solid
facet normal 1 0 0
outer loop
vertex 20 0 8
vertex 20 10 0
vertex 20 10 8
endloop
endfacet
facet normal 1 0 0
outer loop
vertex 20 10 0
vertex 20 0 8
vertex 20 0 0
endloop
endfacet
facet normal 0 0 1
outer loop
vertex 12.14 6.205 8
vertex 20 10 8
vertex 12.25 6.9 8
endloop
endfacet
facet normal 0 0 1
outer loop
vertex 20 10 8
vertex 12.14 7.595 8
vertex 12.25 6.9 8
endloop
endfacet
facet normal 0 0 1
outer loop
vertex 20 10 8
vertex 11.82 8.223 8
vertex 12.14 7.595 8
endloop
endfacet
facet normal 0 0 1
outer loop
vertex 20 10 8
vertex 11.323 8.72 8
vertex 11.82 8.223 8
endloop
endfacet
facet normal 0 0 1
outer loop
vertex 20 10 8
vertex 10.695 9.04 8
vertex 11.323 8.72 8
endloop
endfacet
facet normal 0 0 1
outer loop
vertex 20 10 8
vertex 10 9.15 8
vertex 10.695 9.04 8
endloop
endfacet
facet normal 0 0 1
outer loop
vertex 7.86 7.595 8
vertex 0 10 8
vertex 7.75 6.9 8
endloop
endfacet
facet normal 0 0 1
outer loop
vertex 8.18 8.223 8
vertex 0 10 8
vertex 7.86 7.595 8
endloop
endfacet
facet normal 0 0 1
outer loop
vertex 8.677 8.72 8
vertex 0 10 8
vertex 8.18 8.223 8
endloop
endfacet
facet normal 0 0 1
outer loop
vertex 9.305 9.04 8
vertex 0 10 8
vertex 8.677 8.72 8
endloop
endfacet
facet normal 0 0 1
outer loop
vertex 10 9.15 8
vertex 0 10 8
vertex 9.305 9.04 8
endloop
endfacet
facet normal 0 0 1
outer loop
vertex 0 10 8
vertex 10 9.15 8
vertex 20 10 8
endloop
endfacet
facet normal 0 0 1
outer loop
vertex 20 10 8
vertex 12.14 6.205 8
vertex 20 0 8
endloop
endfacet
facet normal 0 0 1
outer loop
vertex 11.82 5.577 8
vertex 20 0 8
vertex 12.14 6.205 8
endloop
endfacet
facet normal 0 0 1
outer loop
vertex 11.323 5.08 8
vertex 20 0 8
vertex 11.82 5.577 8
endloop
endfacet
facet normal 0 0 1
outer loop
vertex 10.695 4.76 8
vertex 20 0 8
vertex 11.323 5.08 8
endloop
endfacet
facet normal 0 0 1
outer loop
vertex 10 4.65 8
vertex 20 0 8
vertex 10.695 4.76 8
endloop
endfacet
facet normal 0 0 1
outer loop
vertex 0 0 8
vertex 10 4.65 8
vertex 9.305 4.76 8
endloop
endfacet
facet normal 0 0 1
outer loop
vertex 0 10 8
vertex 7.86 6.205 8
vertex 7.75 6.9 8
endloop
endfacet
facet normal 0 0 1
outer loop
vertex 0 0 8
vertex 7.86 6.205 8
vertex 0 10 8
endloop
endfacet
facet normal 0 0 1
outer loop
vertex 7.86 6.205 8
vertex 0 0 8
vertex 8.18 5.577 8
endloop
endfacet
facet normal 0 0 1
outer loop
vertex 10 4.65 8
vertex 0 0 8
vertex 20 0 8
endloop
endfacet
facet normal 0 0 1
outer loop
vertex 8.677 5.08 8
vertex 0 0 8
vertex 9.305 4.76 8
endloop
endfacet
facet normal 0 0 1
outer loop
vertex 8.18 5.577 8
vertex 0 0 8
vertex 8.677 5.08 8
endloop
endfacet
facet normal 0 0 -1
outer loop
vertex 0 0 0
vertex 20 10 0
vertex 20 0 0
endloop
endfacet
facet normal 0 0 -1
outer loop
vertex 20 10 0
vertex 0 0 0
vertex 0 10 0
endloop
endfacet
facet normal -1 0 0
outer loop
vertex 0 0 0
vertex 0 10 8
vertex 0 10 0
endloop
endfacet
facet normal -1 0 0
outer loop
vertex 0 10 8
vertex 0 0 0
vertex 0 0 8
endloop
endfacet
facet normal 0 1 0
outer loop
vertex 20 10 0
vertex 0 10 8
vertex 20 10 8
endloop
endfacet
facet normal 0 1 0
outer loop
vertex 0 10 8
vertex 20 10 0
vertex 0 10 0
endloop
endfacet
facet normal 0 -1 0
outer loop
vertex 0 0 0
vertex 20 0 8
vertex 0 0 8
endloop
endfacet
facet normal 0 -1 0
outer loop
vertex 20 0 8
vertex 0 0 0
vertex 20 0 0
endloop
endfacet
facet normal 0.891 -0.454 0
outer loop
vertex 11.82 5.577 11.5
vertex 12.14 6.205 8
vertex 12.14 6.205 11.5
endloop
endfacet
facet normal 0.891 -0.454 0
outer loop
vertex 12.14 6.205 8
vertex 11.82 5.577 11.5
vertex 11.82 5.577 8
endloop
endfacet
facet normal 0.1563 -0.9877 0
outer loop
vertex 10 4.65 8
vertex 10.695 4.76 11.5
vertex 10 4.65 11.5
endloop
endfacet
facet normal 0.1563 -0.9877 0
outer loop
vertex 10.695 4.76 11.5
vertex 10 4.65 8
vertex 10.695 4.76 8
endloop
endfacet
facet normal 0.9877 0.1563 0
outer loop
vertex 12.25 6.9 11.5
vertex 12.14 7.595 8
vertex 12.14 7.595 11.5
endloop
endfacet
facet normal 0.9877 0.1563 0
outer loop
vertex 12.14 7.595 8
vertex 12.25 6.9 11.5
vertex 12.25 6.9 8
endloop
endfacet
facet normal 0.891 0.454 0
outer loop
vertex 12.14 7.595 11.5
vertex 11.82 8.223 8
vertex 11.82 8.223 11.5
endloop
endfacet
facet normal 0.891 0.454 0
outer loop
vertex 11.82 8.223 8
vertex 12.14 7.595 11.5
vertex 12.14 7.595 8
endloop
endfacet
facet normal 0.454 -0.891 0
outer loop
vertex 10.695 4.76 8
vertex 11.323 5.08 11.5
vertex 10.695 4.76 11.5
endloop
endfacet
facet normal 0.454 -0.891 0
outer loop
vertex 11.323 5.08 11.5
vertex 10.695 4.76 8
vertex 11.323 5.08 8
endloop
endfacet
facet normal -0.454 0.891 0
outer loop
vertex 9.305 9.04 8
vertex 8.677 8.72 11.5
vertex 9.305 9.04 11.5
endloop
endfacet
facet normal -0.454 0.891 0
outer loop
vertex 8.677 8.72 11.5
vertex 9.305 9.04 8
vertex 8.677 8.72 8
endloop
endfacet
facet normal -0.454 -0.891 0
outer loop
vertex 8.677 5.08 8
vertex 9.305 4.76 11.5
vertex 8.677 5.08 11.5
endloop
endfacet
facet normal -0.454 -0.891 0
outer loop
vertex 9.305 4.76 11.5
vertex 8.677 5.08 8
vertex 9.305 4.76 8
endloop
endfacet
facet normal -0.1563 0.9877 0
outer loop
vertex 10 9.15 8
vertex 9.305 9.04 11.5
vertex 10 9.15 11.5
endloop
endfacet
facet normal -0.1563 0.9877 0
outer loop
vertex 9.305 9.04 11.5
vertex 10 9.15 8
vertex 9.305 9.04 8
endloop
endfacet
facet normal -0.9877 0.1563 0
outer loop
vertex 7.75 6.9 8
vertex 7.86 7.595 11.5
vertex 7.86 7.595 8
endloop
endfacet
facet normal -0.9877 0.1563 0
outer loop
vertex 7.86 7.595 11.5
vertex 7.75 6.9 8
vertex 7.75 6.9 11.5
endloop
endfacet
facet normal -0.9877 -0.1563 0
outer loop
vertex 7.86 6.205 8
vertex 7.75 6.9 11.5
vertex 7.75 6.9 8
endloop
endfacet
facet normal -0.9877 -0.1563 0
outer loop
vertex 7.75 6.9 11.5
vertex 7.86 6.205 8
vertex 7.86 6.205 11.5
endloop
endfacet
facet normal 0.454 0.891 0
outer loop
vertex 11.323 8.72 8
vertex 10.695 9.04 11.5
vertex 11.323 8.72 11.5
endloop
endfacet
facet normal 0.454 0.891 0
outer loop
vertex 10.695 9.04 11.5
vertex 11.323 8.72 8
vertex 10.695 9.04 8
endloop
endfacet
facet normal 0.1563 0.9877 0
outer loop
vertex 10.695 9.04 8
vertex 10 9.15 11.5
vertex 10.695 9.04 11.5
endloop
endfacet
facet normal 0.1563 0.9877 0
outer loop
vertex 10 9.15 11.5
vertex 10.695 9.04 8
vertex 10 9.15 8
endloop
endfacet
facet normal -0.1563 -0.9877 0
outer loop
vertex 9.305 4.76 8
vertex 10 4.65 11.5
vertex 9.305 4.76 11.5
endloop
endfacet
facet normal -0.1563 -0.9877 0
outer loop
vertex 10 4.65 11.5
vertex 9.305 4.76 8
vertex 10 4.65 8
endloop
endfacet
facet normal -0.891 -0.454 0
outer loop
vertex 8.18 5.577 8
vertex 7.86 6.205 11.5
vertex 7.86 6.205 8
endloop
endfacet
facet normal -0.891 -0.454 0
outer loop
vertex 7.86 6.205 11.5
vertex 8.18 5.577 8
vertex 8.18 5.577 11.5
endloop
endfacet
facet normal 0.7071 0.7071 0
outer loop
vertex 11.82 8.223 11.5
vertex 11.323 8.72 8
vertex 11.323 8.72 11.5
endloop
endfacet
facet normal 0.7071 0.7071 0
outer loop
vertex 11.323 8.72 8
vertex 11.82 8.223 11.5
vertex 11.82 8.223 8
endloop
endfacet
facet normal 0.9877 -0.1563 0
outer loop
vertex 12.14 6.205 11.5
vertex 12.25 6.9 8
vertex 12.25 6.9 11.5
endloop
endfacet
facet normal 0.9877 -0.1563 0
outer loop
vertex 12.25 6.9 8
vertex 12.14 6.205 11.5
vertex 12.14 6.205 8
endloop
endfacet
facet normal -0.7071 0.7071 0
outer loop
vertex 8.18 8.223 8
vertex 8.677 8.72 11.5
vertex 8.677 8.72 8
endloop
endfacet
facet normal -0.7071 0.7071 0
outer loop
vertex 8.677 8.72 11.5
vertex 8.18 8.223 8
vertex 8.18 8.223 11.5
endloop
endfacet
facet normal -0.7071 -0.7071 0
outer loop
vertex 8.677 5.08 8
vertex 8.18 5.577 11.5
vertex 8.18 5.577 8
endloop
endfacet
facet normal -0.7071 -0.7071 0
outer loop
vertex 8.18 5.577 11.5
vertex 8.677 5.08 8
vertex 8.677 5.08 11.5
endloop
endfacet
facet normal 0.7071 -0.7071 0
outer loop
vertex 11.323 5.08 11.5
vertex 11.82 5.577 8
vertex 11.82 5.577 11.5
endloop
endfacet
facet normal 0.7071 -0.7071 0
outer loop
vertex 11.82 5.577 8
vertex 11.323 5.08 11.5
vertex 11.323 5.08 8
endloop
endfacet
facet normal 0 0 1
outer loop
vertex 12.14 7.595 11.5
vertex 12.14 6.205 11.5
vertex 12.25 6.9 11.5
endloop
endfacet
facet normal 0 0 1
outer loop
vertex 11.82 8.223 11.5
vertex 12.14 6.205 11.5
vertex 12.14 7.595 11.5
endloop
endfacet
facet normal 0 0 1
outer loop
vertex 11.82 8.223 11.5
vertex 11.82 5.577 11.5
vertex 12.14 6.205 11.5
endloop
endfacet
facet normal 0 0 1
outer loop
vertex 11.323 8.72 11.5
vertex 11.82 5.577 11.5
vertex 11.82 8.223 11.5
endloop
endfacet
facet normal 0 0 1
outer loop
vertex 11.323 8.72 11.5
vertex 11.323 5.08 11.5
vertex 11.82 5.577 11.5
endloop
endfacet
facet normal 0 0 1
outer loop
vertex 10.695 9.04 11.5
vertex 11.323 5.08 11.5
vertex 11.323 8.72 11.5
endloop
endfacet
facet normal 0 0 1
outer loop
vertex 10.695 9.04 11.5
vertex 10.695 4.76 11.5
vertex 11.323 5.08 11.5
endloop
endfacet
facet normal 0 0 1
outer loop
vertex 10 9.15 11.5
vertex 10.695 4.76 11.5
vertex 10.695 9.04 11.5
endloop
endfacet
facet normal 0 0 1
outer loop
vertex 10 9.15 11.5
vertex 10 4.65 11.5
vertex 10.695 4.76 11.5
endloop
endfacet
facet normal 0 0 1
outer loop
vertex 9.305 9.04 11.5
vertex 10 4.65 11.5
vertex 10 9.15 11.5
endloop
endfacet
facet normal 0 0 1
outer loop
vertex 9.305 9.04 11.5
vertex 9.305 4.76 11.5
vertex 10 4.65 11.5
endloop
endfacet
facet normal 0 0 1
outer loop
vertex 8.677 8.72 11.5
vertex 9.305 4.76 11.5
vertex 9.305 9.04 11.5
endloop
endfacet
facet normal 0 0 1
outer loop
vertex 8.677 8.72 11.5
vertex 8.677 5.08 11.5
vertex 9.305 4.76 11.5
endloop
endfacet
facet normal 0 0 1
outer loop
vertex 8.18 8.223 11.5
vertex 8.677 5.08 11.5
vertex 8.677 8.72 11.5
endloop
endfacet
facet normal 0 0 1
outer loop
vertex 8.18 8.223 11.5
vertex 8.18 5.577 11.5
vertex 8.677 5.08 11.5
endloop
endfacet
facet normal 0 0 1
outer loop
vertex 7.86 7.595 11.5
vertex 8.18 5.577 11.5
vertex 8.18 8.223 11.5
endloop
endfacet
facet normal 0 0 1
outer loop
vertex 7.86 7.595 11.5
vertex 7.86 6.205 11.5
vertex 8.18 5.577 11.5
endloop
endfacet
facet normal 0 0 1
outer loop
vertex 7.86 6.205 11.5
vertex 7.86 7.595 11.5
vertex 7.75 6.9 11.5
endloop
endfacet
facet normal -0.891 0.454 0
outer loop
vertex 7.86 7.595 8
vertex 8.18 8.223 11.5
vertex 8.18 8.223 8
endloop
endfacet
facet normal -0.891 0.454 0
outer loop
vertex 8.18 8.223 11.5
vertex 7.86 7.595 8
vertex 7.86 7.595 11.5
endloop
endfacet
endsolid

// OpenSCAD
cube([20,10,8],center=false);
translate([10,4.4+5/2,8])
    cylinder(h=3.5,d=5*.9, $fn=20);
